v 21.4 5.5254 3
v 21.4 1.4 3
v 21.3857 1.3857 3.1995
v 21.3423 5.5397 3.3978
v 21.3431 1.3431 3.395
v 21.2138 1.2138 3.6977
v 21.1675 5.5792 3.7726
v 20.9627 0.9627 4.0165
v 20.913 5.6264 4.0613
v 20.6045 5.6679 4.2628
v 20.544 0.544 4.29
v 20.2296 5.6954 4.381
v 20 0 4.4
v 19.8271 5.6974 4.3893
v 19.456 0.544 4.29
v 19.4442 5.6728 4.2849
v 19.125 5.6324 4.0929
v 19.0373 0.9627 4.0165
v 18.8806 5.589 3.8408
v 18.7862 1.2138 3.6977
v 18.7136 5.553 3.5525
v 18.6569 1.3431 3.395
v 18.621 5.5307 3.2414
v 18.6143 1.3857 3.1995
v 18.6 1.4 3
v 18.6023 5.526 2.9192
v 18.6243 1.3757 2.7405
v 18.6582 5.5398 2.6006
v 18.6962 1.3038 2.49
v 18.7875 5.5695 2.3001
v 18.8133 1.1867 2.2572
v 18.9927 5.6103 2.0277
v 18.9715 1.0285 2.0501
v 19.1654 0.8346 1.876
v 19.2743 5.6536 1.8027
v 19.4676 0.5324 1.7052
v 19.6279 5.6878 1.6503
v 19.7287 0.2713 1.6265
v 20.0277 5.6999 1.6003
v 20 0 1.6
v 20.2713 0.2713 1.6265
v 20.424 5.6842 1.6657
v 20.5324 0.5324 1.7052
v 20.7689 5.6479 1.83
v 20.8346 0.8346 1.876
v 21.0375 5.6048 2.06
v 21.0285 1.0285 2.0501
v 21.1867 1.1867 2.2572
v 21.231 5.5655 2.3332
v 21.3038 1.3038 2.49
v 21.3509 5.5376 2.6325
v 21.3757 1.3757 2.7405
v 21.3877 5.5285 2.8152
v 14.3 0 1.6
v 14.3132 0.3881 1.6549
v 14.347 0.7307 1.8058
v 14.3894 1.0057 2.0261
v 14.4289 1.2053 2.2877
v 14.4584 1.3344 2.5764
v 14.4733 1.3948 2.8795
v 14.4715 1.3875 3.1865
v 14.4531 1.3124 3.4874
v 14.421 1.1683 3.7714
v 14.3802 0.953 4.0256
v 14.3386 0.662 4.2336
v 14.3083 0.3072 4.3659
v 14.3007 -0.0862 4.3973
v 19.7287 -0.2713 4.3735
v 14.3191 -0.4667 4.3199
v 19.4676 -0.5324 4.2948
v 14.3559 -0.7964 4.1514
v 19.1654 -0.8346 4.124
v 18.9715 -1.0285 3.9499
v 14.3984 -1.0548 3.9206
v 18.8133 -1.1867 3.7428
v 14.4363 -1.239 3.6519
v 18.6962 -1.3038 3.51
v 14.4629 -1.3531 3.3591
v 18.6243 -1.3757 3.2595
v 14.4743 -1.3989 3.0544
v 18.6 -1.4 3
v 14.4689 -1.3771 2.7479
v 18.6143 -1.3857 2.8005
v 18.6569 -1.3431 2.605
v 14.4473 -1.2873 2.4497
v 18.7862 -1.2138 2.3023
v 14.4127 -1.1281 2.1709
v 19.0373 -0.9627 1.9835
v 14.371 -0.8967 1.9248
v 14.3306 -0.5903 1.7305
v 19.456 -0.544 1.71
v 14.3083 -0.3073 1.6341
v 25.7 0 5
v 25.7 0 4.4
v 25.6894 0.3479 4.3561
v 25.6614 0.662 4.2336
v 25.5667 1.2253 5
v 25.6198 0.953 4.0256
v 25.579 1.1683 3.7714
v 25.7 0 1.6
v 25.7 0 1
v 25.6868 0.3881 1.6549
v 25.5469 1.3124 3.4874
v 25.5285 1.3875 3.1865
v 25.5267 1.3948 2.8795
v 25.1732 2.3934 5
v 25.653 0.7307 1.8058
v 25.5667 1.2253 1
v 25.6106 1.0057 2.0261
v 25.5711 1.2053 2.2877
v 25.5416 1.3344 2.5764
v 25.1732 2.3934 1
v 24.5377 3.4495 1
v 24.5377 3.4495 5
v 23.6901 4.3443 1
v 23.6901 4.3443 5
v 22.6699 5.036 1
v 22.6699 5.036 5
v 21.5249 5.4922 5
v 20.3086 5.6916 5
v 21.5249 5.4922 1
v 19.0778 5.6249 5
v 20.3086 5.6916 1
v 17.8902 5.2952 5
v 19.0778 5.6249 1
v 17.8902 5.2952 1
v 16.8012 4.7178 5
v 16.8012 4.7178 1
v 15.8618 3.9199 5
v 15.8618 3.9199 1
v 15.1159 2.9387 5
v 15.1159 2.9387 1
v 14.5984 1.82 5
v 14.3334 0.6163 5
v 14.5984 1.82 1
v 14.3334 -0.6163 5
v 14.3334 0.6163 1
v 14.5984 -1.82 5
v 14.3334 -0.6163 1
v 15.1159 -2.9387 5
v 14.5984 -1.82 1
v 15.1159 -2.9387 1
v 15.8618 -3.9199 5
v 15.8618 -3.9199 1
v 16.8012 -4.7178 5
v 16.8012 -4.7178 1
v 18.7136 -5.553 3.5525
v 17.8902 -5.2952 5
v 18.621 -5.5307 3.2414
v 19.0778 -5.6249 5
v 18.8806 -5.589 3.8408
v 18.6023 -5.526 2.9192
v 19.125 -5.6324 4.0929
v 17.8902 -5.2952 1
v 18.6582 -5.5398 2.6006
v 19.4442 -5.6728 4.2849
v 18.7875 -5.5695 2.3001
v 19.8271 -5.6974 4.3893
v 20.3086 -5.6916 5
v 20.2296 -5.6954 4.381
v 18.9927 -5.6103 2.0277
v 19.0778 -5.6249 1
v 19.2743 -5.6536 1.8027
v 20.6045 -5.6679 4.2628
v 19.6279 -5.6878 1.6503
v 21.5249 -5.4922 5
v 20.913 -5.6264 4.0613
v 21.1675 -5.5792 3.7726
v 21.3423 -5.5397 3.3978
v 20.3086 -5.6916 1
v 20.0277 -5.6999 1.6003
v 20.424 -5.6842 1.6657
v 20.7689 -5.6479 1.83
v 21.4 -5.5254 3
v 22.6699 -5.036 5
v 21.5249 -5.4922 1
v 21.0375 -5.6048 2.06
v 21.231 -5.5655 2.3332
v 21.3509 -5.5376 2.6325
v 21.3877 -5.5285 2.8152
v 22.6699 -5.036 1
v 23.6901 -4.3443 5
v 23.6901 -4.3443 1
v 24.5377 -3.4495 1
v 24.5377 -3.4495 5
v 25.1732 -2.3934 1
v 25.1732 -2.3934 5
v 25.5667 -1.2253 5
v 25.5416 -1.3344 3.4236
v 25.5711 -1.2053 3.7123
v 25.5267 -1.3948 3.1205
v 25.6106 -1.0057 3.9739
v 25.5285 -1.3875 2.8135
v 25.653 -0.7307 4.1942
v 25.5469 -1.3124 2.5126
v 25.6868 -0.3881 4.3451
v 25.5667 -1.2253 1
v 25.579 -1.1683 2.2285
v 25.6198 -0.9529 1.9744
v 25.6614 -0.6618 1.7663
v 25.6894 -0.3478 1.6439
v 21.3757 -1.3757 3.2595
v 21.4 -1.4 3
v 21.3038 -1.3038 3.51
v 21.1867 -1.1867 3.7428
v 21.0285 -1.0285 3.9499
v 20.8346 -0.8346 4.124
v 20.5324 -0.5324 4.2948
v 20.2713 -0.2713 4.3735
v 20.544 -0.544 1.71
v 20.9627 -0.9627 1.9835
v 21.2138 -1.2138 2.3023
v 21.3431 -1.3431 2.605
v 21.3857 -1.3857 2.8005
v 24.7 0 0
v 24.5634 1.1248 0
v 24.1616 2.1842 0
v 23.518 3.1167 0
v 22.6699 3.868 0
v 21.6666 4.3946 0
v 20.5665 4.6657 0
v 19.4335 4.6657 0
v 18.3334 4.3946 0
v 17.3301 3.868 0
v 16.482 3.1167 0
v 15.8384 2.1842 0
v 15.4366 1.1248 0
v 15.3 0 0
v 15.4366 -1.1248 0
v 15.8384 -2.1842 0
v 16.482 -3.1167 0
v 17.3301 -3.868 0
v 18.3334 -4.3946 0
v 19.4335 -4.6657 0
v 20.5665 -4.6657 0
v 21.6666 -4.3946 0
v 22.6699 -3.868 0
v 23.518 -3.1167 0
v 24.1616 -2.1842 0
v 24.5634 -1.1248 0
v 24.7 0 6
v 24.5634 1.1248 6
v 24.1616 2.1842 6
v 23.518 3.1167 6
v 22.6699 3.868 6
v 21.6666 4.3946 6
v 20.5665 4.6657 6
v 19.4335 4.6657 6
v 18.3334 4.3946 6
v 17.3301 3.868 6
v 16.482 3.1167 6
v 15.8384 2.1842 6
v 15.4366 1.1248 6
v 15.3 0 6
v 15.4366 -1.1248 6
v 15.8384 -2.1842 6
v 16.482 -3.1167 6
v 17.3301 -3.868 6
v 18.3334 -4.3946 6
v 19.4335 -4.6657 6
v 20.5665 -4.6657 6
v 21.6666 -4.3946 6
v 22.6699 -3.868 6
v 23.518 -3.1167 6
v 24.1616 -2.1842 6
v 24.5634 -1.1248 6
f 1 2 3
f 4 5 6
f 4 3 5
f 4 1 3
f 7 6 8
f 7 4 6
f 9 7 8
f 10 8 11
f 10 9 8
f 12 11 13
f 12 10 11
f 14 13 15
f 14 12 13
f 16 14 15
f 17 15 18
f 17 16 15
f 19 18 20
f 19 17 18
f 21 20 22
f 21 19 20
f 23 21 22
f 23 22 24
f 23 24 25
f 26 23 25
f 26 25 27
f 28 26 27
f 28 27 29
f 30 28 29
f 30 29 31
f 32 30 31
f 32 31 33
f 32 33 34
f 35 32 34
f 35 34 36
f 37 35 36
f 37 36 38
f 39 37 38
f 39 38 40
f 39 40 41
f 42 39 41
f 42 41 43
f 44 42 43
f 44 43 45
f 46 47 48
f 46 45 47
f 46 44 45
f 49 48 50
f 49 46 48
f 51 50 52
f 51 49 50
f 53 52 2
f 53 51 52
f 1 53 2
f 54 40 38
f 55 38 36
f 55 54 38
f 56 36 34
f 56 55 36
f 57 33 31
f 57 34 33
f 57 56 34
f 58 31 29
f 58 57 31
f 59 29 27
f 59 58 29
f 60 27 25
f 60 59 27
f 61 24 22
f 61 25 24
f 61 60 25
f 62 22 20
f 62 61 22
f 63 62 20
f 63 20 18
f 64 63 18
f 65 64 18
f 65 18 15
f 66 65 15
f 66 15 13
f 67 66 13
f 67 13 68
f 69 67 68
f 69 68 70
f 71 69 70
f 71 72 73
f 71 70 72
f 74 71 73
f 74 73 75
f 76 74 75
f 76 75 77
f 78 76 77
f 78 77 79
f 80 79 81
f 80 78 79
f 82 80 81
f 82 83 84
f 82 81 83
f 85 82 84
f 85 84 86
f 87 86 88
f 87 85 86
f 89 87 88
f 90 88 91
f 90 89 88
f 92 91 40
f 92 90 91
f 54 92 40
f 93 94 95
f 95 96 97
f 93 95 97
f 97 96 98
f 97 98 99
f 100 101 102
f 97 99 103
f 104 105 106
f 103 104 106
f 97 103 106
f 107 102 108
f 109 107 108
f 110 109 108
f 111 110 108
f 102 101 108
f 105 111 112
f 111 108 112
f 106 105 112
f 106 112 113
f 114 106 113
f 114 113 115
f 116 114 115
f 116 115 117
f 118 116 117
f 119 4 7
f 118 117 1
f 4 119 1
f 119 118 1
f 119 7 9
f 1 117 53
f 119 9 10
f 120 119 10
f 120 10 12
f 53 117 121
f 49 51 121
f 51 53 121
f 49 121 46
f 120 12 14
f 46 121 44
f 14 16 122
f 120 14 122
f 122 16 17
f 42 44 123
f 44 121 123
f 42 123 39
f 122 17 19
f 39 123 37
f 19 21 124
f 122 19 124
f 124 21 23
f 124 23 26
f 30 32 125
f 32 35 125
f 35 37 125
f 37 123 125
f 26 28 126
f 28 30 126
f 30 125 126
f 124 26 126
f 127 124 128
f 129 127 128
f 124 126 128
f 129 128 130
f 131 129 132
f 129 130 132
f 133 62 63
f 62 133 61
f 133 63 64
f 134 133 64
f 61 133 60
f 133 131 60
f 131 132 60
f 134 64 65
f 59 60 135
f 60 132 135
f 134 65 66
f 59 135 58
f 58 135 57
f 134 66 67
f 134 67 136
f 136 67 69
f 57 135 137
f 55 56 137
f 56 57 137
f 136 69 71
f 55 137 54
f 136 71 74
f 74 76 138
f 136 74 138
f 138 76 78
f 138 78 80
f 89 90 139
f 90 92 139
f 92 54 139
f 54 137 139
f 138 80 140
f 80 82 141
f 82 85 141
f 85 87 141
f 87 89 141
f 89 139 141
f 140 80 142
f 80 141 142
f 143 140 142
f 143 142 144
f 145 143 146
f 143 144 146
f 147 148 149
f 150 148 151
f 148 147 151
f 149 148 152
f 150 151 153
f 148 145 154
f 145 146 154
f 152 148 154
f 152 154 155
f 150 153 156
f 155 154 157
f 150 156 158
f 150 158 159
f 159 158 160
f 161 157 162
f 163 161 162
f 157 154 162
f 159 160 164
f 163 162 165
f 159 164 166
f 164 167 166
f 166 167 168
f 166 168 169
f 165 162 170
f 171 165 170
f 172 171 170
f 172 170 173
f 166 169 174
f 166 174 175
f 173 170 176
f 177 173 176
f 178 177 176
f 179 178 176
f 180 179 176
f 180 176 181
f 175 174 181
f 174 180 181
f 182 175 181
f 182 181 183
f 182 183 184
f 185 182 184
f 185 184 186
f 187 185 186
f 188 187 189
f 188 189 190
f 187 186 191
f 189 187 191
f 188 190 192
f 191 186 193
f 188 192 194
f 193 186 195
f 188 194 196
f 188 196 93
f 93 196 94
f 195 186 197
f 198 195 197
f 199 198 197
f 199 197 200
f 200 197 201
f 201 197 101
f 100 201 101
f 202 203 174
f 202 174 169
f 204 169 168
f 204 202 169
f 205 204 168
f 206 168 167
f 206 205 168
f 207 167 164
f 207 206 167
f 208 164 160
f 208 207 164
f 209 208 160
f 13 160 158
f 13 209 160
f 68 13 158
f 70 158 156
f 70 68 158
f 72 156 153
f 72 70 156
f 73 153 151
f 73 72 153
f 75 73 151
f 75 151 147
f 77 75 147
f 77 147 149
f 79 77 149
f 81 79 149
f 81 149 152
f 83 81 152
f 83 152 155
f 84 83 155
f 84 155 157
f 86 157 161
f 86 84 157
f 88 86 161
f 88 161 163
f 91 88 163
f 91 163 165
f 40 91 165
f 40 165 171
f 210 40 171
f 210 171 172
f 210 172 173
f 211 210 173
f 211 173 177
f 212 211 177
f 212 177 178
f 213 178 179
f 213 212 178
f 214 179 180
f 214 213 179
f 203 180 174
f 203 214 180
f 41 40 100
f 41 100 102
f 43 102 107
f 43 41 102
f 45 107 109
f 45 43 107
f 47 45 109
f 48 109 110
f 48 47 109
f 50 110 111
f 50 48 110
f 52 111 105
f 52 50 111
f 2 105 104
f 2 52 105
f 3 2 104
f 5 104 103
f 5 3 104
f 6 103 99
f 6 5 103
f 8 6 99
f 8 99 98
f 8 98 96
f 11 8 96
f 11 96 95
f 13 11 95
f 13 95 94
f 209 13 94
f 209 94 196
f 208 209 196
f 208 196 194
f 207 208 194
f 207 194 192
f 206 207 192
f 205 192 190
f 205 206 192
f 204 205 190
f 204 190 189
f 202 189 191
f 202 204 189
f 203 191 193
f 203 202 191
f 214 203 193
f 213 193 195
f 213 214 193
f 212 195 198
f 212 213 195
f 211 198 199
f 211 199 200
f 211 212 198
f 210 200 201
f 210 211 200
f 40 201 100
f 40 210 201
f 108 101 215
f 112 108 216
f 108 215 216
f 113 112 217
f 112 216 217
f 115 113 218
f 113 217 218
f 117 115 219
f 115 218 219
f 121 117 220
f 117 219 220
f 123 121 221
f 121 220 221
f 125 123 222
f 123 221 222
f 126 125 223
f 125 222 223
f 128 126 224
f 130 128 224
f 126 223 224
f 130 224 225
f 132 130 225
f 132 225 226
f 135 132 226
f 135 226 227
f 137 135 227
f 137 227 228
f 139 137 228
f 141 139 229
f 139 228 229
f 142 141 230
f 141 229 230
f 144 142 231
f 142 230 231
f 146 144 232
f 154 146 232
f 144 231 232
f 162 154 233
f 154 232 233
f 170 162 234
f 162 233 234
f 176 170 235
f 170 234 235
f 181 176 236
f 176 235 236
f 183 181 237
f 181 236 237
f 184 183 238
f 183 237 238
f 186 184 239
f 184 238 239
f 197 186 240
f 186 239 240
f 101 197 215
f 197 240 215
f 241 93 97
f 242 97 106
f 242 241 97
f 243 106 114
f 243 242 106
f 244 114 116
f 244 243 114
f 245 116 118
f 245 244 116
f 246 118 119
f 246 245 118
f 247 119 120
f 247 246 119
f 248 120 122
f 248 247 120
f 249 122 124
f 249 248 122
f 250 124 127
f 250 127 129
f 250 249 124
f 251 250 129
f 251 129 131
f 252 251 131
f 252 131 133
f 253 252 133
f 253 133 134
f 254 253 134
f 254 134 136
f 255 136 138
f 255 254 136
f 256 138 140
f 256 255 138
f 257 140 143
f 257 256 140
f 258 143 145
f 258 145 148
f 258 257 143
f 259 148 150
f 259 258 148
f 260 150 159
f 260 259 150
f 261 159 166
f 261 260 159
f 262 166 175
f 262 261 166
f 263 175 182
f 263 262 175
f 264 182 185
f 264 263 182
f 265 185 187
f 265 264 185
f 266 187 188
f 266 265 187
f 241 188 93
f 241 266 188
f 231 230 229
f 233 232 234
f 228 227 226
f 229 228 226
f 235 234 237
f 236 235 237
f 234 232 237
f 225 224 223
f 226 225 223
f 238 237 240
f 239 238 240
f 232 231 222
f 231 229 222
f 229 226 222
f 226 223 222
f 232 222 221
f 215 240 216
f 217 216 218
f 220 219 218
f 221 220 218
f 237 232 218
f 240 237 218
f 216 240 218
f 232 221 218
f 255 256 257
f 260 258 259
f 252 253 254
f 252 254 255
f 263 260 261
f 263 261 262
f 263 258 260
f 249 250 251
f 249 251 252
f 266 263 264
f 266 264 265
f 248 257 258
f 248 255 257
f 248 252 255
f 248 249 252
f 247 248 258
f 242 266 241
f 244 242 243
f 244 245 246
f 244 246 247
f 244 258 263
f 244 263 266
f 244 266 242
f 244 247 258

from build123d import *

# Parameters (mm, degrees)
CYLINDER005_R           = 1.4
CYLINDER005_DEPTH       = 18
CYLINDER005_ROLL_ANGLE  = 90
CYLINDER012_R           = 1.4
CYLINDER012_DEPTH       = 18
CYLINDER012_PITCH_ANGLE = 90
CYLINDER004_R           = 5.7
CYLINDER004_DEPTH       = 6
CHAMFER_SIZE            = 1


with BuildPart() as cylinder005:
    # Cylinder005 → Cylinder005 (new body)
    with BuildSketch(Plane.XY):
        Circle(CYLINDER005_R)
    extrude(amount=CYLINDER005_DEPTH)


with BuildPart() as cylinder005_1:
    # Cylinder005 roll: moved
    add(cylinder005.part.rotate(Axis((0, 0, 0), (1, 0, 0)), CYLINDER005_ROLL_ANGLE))


with BuildPart() as cylinder005_2:
    # Cylinder005 placement: moved
    add(cylinder005_1.part.moved(Location((0, 9, 3))))


with BuildPart() as joiner_pins:
    # Cylinder012 → Cylinder012 (new body)
    with BuildSketch(Plane.XY):
        Circle(CYLINDER012_R)
    extrude(amount=CYLINDER012_DEPTH)


with BuildPart() as joiner_pins_1:
    # Cylinder012 pitch: moved
    add(joiner_pins.part.rotate(Axis((0, 0, 0), (0, 1, 0)), CYLINDER012_PITCH_ANGLE))


with BuildPart() as joiner_pins_2:
    # Cylinder012 placement: moved
    add(joiner_pins_1.part.moved(Location((-9, 0, 3))))

    # Fusion002: union Cylinder005
    add(cylinder005_2.part)


with BuildPart() as joiner:
    # Cylinder004 → Cylinder004 (new body)
    with BuildSketch(Plane.XY):
        Circle(CYLINDER004_R)
    extrude(amount=CYLINDER004_DEPTH)

    # Cut009: cut joiner pins
    add(joiner_pins_2.part, mode=Mode.SUBTRACT)

    # Chamfer
    chamfer_edges = [joiner.edges().sort_by_distance(p)[0] for p in [
        (-5.7, 0, 0),
        (-5.7, 0, 6),
    ]]
    chamfer(chamfer_edges, length=CHAMFER_SIZE)


with BuildPart() as joiner_1:
    # Chamfer placement: moved
    add(joiner.part.moved(Location((20, 0, 0))))


solid = joiner_1.part
